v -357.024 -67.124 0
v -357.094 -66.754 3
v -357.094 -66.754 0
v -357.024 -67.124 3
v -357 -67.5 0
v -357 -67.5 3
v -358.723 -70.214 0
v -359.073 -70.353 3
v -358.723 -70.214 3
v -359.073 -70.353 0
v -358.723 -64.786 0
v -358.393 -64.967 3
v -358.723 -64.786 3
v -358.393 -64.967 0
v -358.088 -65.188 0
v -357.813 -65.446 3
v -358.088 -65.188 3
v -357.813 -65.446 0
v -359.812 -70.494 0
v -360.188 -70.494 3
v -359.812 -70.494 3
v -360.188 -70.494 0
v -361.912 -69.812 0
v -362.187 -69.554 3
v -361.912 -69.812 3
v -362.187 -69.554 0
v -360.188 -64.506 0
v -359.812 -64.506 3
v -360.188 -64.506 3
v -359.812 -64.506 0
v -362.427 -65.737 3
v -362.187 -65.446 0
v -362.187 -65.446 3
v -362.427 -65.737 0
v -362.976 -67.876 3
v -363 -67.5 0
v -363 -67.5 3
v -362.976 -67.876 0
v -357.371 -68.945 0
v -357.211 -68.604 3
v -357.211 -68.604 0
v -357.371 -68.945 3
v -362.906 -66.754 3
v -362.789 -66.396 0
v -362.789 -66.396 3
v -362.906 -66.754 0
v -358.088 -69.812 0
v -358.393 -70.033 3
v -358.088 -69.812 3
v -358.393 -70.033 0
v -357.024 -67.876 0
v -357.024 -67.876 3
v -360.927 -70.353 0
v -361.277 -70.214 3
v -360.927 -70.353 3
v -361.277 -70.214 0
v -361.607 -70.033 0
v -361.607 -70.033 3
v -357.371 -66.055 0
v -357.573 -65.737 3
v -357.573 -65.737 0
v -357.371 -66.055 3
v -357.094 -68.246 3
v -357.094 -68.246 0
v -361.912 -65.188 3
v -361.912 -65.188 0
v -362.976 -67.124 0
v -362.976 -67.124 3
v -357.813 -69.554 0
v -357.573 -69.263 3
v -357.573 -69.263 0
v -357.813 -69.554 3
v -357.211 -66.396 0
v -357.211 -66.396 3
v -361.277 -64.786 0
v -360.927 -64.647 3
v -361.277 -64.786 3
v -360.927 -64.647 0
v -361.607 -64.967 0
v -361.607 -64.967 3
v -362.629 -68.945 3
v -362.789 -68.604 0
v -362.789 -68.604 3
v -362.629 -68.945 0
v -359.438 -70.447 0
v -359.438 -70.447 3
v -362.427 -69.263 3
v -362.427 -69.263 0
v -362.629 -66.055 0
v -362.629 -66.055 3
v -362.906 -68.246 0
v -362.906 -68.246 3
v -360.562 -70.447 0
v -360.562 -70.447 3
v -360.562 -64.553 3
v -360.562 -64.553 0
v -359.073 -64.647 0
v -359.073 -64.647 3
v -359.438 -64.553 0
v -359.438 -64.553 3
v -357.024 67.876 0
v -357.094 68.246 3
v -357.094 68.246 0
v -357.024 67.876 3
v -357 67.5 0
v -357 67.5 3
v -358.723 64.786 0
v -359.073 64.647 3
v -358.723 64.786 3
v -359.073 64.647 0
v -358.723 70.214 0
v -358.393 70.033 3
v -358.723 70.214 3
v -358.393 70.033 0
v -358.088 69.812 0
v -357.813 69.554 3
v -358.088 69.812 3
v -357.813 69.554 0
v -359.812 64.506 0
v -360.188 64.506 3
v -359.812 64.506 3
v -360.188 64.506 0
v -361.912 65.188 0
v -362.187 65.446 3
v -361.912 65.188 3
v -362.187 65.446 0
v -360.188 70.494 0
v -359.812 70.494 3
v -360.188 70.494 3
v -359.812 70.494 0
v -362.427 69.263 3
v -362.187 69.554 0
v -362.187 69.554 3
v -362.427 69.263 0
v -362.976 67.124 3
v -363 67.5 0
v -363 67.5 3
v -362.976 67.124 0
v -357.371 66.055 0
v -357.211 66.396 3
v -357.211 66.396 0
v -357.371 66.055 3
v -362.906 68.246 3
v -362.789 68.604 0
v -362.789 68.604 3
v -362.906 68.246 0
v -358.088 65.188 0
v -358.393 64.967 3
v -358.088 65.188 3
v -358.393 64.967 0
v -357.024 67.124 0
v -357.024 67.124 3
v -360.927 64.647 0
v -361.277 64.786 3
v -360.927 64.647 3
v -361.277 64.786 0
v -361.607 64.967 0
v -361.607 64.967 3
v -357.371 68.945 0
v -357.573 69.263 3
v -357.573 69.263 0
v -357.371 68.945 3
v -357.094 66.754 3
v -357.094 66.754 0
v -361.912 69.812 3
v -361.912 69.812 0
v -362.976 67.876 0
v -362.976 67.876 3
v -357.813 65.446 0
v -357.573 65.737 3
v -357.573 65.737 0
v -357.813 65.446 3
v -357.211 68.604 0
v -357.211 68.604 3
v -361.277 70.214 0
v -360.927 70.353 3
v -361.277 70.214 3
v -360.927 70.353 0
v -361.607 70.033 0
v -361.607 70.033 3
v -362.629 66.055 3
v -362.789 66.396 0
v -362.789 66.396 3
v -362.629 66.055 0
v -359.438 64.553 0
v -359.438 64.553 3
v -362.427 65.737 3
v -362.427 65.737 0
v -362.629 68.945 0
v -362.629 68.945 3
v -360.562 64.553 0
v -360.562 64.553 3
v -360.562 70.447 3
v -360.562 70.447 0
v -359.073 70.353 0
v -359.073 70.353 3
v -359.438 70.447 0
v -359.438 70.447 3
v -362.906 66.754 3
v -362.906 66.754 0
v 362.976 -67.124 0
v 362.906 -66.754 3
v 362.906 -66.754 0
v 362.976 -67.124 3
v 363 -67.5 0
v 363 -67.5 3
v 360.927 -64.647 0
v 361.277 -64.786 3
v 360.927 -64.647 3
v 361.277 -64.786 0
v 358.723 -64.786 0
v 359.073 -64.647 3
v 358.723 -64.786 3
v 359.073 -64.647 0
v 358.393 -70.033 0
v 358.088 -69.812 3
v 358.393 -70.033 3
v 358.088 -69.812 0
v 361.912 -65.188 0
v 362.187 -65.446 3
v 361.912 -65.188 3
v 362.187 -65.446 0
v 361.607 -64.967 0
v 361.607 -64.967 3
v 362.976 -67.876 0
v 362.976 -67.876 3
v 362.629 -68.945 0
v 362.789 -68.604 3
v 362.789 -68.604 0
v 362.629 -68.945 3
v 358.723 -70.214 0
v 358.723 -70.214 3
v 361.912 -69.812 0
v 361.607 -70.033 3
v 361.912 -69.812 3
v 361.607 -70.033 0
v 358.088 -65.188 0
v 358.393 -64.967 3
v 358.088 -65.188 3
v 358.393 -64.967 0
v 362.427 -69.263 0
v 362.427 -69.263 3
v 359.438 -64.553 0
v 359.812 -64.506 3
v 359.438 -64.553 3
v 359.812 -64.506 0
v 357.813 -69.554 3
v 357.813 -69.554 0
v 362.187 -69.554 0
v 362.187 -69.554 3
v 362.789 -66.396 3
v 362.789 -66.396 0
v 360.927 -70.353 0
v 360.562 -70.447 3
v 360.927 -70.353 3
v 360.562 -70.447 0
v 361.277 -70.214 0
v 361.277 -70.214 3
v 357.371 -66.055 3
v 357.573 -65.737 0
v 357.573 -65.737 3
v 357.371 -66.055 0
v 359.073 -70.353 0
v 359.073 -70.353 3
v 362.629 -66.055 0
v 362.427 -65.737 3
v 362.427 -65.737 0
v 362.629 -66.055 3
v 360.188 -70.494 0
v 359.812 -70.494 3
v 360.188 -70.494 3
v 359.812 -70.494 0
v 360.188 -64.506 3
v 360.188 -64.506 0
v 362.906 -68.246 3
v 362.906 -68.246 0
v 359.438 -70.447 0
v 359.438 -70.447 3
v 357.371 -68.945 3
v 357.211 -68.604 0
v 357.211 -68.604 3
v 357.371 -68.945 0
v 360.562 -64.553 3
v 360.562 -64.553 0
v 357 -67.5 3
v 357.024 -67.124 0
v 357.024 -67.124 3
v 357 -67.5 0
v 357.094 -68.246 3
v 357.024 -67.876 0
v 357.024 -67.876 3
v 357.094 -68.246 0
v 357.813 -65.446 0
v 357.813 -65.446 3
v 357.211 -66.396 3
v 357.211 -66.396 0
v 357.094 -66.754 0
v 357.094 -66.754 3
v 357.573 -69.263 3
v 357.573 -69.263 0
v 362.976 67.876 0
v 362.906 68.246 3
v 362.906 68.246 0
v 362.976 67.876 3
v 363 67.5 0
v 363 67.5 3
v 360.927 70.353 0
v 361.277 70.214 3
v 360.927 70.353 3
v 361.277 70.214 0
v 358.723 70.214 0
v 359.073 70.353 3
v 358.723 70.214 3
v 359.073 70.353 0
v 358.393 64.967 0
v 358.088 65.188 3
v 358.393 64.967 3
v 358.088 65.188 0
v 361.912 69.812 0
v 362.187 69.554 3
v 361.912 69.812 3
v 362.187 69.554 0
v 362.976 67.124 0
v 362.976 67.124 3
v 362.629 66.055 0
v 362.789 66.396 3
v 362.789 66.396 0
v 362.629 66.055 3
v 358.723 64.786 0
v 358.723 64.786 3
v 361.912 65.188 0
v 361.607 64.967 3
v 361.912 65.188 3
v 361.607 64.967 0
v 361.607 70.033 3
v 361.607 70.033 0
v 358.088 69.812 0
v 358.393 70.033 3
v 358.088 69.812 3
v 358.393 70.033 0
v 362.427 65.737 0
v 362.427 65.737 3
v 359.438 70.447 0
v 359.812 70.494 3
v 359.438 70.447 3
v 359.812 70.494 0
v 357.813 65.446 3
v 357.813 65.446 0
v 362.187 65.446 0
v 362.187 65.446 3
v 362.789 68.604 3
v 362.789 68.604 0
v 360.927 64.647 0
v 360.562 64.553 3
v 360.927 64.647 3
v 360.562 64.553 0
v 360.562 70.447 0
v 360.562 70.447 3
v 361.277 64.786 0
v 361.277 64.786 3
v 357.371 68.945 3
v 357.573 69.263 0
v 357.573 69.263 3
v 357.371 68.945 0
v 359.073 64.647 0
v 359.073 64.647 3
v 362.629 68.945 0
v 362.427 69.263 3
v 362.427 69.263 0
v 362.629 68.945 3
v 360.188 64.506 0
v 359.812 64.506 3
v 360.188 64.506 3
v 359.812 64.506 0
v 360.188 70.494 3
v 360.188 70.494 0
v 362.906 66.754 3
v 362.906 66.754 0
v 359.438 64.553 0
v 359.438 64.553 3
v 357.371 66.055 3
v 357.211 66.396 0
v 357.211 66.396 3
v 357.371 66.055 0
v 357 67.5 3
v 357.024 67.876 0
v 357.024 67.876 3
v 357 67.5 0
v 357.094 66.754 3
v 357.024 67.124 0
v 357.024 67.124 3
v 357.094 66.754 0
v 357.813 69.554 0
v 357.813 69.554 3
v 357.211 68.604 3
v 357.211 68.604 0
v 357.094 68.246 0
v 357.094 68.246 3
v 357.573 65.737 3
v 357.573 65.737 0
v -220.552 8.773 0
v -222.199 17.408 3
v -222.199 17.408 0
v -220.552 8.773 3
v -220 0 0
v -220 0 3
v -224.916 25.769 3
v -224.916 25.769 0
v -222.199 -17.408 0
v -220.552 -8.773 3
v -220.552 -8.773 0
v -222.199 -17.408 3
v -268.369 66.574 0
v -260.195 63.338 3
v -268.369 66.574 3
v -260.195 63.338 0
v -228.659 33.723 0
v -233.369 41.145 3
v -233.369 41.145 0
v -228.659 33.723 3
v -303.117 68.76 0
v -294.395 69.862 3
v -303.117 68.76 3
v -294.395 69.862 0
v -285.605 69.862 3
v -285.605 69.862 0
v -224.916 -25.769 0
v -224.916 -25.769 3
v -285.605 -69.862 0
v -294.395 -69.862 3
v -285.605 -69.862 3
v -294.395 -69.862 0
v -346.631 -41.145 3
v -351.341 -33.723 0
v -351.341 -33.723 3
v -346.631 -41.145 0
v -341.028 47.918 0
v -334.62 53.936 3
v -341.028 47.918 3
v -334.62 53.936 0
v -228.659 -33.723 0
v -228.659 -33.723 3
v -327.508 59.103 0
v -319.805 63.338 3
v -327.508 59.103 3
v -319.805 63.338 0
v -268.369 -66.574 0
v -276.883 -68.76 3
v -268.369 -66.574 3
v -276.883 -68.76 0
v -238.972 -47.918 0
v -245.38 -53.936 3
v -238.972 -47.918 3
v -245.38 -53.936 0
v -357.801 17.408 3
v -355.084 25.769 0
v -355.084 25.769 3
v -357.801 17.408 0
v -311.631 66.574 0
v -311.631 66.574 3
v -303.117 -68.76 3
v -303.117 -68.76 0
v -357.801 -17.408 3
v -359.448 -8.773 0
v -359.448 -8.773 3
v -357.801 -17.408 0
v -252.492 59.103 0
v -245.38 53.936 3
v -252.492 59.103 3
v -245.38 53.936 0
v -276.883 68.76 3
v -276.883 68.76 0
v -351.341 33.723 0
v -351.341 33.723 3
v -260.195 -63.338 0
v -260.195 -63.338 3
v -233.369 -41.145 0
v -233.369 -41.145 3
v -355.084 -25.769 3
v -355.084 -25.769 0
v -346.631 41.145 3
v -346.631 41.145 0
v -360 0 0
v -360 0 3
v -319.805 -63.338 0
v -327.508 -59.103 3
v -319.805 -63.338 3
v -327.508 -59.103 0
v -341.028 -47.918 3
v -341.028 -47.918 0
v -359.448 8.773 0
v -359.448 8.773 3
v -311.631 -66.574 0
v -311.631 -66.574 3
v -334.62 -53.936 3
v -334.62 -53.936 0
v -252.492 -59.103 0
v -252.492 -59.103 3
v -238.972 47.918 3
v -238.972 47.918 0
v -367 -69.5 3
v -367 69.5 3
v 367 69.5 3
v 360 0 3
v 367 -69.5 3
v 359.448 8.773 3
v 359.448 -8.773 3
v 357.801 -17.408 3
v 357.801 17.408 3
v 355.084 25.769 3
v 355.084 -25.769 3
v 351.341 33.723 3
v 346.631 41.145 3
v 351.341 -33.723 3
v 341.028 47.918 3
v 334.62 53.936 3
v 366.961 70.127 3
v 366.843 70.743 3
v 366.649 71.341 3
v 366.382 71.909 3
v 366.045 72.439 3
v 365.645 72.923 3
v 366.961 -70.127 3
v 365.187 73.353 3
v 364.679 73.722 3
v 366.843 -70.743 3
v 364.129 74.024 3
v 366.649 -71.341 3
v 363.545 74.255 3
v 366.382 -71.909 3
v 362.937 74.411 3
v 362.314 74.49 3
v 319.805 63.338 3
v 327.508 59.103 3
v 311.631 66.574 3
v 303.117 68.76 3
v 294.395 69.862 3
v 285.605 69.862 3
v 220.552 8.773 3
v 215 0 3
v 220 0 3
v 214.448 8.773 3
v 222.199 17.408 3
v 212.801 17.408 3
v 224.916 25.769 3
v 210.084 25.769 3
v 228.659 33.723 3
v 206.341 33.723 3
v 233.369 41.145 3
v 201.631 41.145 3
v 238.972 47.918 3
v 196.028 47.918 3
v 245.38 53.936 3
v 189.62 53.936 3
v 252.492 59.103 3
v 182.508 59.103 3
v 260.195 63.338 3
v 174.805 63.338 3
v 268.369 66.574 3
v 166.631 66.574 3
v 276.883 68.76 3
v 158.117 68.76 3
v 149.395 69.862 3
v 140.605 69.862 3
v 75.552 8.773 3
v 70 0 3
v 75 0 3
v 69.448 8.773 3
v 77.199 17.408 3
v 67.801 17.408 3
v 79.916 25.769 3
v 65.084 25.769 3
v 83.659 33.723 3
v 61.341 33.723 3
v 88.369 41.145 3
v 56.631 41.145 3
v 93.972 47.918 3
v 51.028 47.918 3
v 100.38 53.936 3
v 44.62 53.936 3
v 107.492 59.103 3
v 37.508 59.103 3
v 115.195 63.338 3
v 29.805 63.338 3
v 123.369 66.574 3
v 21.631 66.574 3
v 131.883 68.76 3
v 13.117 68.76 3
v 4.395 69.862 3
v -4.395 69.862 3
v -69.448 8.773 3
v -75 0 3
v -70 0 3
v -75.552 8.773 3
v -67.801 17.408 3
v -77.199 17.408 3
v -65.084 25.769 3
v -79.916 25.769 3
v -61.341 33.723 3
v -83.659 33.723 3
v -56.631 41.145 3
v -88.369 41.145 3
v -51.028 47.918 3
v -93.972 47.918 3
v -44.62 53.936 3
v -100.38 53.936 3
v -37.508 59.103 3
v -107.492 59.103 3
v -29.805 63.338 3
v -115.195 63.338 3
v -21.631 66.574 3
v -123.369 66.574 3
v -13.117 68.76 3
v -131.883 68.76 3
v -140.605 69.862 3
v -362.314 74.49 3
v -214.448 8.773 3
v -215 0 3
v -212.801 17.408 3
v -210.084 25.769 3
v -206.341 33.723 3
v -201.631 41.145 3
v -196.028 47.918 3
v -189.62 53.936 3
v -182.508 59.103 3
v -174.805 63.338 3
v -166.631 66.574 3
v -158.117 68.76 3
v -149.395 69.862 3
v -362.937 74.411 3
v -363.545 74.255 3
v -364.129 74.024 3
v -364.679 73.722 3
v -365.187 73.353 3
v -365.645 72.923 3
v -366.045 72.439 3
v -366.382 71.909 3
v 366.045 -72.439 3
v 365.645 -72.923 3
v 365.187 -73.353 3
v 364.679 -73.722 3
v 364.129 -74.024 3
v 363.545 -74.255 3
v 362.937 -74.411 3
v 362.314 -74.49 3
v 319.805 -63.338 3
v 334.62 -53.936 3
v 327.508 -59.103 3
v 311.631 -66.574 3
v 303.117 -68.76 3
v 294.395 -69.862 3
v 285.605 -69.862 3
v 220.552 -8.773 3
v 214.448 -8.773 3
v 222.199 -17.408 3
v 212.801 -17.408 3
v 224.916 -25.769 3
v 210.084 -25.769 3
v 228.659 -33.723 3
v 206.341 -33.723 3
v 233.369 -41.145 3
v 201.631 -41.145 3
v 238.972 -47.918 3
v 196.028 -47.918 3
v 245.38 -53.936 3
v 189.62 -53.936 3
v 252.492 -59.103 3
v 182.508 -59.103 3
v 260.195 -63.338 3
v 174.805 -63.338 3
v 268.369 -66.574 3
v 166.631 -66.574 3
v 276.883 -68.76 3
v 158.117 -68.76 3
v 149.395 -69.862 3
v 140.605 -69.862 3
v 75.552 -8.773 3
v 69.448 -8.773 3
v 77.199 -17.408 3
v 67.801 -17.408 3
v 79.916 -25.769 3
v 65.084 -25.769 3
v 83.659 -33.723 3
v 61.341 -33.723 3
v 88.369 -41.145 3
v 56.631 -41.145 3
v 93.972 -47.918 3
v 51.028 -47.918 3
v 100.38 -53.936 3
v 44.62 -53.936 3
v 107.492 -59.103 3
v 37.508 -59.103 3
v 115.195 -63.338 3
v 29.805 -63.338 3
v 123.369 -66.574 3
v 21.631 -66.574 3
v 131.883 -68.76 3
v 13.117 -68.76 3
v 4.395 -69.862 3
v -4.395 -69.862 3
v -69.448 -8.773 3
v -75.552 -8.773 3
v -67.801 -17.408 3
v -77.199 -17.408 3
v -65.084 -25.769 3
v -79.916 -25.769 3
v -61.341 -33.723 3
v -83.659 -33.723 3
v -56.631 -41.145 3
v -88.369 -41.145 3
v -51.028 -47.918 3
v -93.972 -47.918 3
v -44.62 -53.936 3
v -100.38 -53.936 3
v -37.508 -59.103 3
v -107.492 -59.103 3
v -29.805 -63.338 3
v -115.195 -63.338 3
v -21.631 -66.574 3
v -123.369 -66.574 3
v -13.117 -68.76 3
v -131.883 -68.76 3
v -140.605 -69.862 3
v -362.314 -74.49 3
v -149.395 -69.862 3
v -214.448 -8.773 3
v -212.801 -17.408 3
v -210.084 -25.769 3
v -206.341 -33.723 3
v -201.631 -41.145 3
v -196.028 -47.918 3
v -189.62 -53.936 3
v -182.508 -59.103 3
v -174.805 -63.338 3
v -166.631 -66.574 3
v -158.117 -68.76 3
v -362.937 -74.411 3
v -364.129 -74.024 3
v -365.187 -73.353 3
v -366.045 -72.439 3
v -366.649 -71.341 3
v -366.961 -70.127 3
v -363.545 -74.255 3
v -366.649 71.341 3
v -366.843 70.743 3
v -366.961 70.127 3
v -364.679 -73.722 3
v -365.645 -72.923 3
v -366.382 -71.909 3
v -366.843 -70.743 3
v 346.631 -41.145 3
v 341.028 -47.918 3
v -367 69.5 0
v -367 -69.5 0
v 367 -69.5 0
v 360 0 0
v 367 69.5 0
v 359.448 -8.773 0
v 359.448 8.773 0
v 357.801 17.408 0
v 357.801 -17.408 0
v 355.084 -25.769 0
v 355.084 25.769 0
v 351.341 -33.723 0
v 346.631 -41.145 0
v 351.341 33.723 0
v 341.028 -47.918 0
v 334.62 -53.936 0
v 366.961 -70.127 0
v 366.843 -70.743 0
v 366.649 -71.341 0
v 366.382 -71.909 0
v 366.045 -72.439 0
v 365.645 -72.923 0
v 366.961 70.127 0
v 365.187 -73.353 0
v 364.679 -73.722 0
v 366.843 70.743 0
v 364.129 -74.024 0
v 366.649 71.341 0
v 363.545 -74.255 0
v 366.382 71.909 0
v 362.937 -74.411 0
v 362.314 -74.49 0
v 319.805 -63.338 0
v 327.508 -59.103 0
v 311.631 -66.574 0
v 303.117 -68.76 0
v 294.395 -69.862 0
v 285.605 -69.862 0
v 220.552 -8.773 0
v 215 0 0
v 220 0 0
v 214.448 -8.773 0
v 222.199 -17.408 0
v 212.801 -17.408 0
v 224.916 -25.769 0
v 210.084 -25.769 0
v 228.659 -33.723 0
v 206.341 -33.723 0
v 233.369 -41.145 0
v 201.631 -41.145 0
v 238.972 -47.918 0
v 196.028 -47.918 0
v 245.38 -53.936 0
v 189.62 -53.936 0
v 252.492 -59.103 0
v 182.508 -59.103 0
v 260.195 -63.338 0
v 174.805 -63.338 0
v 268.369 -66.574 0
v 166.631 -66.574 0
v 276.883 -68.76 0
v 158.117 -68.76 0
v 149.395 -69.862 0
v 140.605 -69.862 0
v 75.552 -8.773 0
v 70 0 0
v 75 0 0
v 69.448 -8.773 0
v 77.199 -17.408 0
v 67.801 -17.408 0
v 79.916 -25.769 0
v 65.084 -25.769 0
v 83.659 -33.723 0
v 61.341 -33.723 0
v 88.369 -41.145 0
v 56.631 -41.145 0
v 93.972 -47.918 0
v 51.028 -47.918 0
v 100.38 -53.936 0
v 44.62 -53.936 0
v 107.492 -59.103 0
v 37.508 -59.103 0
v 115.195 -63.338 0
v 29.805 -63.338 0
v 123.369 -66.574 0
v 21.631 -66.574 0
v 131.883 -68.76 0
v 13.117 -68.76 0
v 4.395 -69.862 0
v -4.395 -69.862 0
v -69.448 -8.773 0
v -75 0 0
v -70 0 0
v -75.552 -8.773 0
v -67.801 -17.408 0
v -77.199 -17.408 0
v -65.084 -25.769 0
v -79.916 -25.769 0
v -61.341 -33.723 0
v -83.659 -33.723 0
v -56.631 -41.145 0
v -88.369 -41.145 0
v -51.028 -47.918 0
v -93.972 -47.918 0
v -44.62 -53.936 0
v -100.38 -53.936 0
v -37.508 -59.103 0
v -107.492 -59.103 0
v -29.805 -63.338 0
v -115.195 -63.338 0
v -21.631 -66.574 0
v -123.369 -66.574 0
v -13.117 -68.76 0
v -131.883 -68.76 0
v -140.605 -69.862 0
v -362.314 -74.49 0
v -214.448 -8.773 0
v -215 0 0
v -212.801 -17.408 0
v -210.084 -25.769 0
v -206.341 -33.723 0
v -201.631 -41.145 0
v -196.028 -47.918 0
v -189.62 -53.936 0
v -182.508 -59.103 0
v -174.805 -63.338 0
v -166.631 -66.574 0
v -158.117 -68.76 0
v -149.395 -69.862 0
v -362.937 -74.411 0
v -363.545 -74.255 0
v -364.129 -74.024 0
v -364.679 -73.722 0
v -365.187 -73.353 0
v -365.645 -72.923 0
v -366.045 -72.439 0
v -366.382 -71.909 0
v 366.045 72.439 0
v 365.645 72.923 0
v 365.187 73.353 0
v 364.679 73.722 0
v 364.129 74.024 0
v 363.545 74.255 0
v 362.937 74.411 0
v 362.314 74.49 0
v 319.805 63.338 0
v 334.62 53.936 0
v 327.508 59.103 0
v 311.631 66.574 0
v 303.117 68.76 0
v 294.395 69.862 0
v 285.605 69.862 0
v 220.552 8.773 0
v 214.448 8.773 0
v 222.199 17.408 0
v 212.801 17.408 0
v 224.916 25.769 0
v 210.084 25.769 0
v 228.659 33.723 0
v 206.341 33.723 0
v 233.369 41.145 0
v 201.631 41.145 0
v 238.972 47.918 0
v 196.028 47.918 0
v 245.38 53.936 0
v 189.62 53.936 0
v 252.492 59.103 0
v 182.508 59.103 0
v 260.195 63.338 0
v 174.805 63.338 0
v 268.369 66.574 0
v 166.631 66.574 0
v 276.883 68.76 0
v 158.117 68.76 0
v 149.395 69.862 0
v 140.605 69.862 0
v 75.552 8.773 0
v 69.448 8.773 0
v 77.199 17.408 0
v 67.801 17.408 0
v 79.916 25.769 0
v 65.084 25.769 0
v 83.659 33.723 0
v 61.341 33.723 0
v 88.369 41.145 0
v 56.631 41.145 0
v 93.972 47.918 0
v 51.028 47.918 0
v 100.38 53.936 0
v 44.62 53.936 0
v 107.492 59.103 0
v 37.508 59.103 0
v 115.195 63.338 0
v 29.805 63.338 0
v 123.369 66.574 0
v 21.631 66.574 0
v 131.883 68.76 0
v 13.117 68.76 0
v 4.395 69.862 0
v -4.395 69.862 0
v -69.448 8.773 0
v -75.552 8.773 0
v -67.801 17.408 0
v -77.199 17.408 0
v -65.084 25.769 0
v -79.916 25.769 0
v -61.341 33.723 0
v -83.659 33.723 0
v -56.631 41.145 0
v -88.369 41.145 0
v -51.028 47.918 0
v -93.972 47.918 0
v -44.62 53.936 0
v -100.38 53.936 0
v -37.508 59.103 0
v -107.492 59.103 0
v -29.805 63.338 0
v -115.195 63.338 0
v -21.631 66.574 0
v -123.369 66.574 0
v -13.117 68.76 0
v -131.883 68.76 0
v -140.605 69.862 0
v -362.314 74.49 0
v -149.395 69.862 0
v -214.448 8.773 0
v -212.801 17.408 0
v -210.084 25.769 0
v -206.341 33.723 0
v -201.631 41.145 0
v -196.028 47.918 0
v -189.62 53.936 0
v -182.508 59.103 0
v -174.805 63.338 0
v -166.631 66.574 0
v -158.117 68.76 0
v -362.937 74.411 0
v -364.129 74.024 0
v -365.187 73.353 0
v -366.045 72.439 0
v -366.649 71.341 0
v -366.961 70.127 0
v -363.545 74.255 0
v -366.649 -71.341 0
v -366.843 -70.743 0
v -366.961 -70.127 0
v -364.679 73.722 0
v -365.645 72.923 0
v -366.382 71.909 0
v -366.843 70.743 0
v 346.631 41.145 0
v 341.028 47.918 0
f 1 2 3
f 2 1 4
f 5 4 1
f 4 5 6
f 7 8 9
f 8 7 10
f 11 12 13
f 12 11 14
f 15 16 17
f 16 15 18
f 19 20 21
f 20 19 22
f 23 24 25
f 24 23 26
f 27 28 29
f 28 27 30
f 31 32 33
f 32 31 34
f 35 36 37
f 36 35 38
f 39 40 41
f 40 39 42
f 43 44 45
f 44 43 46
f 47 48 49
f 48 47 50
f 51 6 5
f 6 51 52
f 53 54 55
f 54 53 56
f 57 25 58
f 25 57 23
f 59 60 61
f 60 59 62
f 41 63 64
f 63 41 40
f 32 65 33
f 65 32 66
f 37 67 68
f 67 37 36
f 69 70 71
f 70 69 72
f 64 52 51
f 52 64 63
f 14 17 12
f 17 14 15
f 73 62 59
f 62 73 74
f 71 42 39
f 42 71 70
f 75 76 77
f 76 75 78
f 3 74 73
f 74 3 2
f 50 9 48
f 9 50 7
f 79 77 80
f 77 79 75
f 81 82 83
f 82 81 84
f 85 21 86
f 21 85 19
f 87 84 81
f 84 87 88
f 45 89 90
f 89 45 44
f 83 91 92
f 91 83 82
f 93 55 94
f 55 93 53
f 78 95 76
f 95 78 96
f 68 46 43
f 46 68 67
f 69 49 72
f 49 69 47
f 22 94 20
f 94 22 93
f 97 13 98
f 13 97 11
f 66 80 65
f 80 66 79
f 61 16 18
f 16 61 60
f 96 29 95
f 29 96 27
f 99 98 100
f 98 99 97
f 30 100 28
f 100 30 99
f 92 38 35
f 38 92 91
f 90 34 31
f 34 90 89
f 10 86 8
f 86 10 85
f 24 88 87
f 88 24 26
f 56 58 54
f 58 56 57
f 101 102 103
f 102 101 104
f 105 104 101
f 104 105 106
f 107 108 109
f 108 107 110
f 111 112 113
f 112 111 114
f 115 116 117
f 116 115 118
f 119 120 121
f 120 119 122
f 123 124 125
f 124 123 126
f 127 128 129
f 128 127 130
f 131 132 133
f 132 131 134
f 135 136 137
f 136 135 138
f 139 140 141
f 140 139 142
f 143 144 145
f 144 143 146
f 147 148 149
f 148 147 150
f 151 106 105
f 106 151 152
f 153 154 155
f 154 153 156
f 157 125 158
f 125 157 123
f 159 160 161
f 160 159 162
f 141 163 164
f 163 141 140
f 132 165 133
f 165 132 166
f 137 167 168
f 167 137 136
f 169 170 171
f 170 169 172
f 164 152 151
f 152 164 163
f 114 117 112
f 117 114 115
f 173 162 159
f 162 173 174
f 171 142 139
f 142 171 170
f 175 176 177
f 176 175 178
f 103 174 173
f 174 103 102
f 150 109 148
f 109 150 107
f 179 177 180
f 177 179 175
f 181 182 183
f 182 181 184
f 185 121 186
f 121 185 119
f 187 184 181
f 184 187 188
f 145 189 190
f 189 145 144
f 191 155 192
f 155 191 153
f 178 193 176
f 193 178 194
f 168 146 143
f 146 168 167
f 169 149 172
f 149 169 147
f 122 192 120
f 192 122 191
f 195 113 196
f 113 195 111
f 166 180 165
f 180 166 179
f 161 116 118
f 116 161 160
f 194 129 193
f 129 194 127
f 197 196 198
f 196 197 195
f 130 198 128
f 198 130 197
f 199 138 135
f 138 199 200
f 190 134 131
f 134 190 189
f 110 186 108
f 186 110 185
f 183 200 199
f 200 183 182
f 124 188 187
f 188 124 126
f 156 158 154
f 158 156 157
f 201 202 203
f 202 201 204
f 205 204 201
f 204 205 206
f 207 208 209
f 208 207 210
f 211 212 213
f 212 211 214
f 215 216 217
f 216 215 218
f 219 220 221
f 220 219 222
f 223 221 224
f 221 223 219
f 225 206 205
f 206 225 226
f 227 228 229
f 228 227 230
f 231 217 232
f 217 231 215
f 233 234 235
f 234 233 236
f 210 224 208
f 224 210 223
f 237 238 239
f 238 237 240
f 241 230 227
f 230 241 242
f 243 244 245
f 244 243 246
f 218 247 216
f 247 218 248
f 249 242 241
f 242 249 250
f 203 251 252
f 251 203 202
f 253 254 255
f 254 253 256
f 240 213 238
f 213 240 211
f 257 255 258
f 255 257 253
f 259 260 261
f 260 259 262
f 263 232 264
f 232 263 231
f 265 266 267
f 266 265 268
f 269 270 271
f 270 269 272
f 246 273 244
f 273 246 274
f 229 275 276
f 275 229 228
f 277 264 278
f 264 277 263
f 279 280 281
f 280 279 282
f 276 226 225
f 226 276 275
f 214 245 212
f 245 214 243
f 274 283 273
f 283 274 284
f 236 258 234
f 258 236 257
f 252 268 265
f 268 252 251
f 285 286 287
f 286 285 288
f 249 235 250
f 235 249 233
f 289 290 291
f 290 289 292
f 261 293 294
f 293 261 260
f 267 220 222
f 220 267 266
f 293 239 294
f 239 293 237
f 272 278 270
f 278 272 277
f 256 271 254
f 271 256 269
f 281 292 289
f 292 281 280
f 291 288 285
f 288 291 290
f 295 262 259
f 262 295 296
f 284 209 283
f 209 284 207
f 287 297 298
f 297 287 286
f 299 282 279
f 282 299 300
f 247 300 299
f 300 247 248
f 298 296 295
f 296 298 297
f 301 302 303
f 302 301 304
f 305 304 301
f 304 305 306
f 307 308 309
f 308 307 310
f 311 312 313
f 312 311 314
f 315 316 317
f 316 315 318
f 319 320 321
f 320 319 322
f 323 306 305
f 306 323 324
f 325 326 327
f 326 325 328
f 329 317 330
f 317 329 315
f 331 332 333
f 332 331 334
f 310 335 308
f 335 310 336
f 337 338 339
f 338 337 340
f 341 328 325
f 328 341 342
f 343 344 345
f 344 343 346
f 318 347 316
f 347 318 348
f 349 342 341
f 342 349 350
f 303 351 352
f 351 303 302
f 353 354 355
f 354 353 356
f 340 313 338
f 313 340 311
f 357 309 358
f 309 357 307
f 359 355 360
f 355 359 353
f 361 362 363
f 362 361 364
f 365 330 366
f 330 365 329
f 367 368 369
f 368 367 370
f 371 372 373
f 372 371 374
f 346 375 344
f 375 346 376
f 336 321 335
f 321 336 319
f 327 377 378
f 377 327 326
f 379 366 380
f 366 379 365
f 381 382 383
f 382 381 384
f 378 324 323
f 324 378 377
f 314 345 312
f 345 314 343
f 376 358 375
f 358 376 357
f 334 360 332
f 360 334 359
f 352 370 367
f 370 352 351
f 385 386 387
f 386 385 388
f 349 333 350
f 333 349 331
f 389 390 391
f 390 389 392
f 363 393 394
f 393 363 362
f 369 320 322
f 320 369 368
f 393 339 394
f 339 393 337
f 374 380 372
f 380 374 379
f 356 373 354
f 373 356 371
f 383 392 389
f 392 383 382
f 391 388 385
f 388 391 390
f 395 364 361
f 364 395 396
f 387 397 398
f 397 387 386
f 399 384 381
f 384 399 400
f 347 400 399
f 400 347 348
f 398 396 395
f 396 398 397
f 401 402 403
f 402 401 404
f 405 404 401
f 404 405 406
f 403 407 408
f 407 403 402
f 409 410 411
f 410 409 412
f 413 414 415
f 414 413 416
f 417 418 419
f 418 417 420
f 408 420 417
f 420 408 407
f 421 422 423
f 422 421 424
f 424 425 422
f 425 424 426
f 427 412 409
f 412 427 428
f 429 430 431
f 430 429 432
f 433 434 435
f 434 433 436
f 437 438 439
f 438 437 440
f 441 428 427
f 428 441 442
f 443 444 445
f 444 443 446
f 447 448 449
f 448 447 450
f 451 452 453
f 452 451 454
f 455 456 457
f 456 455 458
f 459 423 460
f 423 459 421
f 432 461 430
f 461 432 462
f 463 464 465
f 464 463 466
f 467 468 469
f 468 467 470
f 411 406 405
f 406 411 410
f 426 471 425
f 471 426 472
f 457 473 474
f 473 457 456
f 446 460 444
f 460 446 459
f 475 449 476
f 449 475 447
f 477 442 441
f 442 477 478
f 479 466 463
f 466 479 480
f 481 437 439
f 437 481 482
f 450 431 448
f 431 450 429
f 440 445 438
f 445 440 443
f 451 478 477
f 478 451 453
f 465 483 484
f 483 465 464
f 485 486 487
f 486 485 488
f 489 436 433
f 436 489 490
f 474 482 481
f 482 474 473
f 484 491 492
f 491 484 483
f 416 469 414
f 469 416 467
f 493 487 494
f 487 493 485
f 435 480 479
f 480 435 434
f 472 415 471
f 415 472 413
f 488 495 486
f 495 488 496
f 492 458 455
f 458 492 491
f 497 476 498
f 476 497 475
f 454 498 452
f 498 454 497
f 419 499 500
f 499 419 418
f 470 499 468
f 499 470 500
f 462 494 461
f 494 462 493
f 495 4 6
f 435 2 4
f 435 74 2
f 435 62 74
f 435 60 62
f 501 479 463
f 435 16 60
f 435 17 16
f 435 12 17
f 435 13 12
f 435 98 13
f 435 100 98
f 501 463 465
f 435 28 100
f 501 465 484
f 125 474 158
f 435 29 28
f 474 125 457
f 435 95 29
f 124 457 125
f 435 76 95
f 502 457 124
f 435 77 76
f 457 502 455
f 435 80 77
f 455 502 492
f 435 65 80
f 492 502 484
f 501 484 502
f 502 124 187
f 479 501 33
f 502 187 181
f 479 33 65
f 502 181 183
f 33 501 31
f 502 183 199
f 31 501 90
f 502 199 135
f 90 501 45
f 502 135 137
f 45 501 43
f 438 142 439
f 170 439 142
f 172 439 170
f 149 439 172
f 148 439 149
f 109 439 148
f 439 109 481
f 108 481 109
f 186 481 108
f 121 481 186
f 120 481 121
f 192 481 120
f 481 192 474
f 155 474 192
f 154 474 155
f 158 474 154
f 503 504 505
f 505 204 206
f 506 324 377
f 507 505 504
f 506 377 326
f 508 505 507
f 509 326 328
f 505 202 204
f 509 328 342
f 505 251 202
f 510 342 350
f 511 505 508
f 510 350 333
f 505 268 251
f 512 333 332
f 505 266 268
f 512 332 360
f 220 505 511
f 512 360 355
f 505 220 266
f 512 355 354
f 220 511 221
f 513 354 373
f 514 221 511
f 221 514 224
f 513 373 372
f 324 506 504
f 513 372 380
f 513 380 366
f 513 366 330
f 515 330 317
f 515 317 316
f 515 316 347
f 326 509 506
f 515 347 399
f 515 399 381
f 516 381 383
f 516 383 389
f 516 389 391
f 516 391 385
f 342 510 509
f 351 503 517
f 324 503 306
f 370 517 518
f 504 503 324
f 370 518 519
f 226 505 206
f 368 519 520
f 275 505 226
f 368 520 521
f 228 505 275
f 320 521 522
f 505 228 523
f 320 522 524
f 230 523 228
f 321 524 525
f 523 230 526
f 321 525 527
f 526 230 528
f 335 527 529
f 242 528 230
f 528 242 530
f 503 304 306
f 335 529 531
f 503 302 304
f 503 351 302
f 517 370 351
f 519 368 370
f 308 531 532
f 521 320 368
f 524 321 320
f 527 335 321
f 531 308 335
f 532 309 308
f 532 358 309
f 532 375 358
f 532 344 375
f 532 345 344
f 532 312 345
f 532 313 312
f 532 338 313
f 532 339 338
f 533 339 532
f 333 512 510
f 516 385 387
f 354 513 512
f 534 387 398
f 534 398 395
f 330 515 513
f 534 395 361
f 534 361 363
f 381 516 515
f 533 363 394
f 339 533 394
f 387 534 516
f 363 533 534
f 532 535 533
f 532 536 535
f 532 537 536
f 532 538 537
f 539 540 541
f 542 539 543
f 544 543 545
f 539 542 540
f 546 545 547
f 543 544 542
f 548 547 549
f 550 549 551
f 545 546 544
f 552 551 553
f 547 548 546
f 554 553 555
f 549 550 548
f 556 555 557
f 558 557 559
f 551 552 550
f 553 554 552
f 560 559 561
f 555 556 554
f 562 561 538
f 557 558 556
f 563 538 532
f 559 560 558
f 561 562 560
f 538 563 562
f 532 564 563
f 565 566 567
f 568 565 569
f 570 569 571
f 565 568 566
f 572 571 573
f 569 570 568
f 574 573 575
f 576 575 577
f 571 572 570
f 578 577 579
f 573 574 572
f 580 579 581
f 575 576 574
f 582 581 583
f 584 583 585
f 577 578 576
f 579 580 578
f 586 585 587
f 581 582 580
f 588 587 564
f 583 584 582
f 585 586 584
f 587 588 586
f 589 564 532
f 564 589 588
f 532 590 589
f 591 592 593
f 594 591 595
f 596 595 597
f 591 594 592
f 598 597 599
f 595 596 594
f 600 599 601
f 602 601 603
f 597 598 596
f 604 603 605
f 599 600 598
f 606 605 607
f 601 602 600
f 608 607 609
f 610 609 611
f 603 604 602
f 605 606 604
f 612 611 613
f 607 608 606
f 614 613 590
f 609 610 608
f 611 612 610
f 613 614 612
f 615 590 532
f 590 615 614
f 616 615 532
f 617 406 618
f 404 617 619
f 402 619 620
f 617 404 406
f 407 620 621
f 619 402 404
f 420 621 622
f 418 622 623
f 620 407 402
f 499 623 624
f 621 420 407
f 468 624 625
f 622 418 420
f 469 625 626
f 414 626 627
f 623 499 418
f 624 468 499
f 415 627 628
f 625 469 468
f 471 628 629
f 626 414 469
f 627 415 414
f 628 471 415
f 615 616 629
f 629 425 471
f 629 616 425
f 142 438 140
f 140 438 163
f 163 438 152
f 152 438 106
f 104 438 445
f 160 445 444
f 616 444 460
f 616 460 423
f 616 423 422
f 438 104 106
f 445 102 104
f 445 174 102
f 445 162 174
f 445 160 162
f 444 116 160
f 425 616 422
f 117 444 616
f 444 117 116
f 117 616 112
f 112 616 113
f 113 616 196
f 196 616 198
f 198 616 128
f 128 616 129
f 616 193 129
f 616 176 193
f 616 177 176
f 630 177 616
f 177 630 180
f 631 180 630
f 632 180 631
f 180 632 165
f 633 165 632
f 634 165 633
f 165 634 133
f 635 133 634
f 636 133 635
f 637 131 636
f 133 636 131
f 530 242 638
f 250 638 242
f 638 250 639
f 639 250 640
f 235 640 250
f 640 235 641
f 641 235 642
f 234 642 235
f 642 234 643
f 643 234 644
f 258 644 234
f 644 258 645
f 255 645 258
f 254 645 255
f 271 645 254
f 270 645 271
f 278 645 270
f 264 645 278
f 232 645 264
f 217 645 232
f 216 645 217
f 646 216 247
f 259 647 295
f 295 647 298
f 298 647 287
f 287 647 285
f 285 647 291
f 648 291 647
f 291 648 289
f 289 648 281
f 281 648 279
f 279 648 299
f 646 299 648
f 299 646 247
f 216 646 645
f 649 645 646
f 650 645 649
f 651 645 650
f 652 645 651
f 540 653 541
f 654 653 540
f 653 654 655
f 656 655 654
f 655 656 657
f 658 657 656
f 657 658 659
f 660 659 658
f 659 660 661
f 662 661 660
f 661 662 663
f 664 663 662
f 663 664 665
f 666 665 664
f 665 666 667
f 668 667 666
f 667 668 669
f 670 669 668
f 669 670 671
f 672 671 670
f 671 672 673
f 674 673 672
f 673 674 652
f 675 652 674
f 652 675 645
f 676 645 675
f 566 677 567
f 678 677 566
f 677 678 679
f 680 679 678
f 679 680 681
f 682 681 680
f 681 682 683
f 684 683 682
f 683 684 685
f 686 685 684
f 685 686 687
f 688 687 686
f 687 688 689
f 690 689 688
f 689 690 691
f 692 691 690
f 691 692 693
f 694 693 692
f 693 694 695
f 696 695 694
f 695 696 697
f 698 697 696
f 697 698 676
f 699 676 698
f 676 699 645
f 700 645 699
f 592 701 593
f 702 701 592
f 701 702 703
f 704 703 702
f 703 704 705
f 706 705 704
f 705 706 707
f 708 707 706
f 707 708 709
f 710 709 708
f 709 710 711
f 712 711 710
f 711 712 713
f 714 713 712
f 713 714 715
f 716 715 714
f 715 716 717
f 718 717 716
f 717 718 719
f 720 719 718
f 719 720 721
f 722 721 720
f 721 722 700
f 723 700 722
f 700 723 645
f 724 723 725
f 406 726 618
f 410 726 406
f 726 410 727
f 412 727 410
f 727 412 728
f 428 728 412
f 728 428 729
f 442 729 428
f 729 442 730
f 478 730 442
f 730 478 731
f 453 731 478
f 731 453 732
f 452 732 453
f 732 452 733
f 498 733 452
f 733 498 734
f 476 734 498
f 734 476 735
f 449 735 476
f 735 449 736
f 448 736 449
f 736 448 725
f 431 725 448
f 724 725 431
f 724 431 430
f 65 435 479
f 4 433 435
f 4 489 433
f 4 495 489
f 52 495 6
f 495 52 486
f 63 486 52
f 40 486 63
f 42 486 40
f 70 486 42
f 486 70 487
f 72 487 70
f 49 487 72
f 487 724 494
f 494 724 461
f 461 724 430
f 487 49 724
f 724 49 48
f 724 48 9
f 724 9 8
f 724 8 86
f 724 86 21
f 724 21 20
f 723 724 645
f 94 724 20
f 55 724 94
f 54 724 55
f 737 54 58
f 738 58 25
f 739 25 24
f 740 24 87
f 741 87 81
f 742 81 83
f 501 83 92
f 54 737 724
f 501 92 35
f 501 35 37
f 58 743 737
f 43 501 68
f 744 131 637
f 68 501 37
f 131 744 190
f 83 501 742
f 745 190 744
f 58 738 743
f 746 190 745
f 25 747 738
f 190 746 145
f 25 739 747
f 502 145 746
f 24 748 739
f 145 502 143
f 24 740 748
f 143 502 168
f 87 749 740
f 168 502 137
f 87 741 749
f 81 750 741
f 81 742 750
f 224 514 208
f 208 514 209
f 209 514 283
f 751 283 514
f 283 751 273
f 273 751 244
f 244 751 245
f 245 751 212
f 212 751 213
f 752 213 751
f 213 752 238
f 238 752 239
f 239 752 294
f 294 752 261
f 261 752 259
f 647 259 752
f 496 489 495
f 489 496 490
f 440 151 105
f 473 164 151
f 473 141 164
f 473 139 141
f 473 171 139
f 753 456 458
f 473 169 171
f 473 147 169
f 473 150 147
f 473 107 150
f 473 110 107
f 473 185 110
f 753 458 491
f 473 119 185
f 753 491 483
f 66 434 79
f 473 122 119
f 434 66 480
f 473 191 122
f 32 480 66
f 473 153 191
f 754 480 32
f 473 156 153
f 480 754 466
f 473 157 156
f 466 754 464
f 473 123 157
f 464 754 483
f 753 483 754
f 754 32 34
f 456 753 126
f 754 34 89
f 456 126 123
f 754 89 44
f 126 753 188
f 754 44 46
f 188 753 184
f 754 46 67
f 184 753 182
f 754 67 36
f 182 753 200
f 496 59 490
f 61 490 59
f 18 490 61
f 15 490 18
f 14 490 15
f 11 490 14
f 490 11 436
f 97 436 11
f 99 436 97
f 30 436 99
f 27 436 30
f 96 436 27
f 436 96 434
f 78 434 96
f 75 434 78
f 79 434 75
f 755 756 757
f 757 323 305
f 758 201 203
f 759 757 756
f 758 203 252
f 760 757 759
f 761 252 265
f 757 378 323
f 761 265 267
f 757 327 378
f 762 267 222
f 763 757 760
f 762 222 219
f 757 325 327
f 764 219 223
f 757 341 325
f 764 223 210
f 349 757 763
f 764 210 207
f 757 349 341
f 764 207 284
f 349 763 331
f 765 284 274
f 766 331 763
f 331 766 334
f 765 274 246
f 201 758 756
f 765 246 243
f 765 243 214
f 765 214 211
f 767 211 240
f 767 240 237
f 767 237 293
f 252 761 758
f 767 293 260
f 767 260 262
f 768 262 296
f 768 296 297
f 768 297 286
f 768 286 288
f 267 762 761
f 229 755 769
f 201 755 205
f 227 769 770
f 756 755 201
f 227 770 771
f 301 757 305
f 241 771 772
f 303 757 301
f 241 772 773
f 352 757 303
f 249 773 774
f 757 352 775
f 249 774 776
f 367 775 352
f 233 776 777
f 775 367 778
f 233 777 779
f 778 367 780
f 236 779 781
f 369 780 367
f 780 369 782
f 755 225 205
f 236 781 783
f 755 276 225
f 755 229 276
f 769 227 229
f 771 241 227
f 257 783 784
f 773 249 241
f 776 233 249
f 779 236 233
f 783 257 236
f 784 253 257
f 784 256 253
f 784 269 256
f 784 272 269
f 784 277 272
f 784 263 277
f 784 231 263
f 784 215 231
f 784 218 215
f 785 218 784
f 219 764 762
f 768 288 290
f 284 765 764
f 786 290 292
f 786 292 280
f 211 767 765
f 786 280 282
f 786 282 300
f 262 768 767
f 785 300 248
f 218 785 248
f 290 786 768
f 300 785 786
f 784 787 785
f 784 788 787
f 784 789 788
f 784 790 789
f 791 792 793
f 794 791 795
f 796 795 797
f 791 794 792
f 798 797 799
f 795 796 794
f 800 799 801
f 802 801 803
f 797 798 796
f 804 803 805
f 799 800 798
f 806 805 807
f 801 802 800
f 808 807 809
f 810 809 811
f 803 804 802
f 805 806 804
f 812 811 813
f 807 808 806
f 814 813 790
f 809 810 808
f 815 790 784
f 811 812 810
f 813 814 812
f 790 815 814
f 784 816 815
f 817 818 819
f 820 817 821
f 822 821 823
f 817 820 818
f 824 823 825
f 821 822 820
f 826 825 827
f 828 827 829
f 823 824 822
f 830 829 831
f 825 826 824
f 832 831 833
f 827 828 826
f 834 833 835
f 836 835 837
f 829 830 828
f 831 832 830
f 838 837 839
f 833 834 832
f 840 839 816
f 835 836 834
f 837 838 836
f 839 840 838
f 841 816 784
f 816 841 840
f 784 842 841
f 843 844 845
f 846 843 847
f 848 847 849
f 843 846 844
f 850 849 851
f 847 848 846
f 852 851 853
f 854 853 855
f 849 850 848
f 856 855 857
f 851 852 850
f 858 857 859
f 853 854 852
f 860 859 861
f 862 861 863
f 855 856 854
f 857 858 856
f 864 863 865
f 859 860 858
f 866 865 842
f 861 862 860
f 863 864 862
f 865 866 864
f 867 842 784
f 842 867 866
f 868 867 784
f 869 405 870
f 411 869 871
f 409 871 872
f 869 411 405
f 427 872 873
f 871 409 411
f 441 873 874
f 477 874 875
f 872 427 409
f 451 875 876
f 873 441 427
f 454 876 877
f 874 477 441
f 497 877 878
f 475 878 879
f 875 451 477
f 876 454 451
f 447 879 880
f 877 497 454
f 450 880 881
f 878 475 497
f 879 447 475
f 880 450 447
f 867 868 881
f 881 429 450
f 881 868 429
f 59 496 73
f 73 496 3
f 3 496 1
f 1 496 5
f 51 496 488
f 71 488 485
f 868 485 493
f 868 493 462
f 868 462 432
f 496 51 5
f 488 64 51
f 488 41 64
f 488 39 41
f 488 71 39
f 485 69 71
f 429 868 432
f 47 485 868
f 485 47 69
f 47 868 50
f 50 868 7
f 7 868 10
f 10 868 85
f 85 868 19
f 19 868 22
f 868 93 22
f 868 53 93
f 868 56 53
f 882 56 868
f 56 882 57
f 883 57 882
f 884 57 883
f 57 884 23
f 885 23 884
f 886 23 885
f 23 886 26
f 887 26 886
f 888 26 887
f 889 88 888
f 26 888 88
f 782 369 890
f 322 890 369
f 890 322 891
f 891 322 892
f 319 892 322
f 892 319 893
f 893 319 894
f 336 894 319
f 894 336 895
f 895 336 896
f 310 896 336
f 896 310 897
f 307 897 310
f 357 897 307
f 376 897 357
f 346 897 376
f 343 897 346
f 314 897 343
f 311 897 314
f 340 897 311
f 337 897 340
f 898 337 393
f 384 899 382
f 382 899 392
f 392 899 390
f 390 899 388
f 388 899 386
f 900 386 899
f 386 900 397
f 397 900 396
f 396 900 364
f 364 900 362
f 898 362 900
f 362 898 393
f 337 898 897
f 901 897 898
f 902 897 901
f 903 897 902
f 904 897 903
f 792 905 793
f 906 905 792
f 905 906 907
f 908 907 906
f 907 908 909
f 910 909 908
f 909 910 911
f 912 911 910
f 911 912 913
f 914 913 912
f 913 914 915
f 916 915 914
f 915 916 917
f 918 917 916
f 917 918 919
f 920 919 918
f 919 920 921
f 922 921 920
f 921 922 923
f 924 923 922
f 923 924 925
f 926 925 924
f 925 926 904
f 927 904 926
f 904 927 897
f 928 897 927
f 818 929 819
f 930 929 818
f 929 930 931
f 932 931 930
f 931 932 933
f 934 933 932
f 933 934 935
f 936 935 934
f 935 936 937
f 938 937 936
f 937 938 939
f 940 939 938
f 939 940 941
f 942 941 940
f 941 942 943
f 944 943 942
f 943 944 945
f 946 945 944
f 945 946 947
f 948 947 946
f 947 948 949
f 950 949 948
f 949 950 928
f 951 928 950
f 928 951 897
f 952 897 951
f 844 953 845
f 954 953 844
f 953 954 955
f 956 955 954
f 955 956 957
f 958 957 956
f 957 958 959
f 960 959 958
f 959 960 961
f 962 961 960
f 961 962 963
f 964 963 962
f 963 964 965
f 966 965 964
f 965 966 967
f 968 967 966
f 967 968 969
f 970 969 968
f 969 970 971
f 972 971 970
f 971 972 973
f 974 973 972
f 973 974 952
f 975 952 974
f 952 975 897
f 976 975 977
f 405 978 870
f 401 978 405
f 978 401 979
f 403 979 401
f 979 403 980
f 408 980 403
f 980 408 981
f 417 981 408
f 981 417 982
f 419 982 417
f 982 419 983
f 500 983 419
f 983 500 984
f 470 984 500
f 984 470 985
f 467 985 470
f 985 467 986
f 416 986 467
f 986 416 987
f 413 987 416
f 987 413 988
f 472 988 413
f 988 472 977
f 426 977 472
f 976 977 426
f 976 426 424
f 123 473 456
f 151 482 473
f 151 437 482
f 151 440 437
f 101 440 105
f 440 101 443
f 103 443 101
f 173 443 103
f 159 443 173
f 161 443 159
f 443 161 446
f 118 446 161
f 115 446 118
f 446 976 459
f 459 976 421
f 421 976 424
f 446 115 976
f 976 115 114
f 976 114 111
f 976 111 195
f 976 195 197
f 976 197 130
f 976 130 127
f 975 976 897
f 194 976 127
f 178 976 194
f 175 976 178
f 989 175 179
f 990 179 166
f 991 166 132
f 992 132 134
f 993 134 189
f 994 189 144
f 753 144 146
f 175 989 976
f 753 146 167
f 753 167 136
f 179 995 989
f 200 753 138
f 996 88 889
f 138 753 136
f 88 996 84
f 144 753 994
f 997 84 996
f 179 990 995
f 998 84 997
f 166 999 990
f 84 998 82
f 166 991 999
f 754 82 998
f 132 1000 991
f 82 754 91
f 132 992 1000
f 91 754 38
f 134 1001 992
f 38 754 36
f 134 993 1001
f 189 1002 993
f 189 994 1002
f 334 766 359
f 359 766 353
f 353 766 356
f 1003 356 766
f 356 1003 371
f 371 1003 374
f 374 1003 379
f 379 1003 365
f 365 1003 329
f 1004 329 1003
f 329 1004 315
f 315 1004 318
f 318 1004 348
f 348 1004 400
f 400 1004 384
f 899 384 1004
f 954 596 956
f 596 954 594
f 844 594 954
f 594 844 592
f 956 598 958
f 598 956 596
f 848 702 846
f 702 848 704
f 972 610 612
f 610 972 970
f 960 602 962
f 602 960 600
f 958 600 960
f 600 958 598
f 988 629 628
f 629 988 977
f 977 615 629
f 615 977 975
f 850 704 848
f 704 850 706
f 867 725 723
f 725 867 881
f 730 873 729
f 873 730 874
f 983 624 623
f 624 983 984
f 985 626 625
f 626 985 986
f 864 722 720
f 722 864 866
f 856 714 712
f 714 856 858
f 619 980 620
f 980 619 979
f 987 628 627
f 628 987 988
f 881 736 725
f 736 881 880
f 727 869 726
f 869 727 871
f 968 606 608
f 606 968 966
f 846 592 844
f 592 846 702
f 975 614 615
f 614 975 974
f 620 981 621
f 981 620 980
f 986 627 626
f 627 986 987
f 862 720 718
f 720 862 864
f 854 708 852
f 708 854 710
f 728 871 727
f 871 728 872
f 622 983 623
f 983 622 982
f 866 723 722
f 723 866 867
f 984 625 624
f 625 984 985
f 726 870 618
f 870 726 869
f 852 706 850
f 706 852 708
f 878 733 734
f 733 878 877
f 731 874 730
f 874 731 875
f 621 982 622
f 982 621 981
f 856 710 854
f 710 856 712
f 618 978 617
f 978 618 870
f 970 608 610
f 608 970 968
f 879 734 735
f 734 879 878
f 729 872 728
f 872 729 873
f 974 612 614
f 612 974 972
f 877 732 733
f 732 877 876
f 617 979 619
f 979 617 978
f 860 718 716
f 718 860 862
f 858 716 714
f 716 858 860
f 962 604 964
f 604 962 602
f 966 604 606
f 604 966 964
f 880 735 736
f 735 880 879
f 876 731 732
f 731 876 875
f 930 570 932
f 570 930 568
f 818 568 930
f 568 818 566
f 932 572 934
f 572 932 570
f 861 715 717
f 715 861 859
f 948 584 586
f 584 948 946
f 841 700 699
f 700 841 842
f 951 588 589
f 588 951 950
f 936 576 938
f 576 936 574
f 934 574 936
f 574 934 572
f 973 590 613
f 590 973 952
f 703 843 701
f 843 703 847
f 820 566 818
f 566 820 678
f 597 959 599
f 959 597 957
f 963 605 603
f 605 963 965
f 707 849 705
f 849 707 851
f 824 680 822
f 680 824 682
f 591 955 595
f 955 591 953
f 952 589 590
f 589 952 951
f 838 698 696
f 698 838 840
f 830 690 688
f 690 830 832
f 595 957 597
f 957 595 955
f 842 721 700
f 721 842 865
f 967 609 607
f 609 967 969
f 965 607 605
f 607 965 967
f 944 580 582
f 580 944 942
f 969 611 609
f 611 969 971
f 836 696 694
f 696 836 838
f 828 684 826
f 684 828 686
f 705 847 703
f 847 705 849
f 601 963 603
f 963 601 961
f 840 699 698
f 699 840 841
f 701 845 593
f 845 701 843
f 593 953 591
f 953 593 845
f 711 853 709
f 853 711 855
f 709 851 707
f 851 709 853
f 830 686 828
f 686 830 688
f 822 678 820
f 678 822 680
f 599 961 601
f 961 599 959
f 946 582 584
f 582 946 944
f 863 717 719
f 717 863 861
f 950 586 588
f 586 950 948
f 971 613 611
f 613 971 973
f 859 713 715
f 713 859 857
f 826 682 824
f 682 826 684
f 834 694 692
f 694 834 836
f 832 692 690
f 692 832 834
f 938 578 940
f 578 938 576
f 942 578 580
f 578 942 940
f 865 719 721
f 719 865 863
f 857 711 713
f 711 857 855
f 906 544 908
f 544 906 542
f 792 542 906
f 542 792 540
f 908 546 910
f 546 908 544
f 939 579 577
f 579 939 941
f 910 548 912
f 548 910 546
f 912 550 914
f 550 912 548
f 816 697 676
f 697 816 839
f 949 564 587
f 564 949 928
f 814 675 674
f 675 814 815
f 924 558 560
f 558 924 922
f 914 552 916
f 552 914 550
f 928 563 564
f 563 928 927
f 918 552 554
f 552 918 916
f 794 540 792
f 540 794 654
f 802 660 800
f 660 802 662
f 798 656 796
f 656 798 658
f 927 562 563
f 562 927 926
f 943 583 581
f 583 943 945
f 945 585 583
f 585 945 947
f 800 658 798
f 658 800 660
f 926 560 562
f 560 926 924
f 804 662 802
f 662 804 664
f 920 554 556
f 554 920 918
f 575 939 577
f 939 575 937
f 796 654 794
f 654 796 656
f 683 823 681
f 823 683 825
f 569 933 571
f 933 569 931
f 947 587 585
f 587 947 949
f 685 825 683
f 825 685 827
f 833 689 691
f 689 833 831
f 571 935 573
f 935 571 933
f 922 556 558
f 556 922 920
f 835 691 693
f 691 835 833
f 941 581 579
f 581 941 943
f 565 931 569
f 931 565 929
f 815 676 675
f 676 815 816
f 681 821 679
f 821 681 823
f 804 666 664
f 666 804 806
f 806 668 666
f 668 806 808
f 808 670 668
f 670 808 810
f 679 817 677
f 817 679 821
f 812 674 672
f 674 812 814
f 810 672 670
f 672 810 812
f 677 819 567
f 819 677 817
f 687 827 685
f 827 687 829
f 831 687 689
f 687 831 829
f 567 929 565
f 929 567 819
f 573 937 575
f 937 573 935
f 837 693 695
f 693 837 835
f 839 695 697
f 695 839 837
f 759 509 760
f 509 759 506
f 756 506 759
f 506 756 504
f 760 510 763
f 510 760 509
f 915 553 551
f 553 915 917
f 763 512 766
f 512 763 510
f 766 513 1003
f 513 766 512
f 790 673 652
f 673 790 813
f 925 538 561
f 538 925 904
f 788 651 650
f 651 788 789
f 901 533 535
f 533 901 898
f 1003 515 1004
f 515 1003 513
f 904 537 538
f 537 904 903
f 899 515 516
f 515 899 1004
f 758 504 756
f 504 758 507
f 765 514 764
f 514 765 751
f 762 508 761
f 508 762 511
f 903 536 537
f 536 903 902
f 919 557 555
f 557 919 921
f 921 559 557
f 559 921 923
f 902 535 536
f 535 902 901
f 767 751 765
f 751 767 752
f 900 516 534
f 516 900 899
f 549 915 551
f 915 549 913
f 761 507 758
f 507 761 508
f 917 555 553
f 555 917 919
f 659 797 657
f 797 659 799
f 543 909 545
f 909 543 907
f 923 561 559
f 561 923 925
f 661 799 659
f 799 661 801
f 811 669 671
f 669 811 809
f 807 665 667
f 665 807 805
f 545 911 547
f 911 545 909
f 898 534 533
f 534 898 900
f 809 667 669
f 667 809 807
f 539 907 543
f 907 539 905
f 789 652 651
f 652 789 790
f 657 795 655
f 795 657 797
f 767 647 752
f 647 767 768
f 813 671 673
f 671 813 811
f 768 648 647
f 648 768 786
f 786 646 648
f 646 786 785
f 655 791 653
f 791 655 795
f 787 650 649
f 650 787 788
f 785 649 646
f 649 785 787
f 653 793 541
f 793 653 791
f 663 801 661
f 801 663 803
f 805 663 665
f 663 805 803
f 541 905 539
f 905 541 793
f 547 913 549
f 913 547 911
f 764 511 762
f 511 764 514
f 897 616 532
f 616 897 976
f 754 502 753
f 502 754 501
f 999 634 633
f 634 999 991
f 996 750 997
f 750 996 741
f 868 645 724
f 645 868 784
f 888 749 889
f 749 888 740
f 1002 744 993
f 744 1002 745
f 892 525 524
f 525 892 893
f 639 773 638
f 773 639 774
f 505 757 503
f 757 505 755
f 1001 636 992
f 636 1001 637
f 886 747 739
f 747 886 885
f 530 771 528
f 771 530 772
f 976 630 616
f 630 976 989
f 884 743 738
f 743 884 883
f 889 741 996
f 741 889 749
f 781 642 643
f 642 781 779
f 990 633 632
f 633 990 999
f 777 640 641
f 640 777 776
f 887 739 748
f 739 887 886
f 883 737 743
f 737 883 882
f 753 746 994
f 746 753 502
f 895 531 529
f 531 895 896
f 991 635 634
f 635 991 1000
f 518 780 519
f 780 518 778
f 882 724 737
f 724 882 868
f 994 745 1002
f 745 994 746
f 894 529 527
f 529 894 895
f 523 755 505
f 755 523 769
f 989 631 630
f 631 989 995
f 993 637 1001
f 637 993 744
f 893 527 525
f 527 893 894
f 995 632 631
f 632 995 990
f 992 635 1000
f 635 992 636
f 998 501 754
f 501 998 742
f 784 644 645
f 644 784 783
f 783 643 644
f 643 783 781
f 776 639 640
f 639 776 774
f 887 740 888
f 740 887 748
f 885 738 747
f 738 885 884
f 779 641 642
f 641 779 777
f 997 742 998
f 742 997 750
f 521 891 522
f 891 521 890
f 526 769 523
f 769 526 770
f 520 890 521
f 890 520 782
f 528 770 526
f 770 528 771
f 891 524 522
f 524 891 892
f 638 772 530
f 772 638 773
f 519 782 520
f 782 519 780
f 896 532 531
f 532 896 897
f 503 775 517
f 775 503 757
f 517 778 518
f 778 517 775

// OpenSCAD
$fn = 50;


difference() {
	union() {
		hull() {
			translate(v = [-362.0000000000, 69.5000000000, 0]) {
				cylinder(h = 3, r = 5);
			}
			translate(v = [362.0000000000, 69.5000000000, 0]) {
				cylinder(h = 3, r = 5);
			}
			translate(v = [-362.0000000000, -69.5000000000, 0]) {
				cylinder(h = 3, r = 5);
			}
			translate(v = [362.0000000000, -69.5000000000, 0]) {
				cylinder(h = 3, r = 5);
			}
		}
	}
	union() {
		#translate(v = [-360.0000000000, -67.5000000000, -100.0000000000]) {
			cylinder(h = 200, r = 3.0000000000);
		}
		#translate(v = [-360.0000000000, 67.5000000000, -100.0000000000]) {
			cylinder(h = 200, r = 3.0000000000);
		}
		#translate(v = [360.0000000000, -67.5000000000, -100.0000000000]) {
			cylinder(h = 200, r = 3.0000000000);
		}
		#translate(v = [360.0000000000, 67.5000000000, -100.0000000000]) {
			cylinder(h = 200, r = 3.0000000000);
		}
		#translate(v = [-290.0000000000, 0, 0]) {
			cylinder(h = 3, r = 70.0000000000);
		}
		#translate(v = [-145.0000000000, 0, 0]) {
			cylinder(h = 3, r = 70.0000000000);
		}
		#cylinder(h = 3, r = 70.0000000000);
		#translate(v = [145.0000000000, 0, 0]) {
			cylinder(h = 3, r = 70.0000000000);
		}
		#translate(v = [290.0000000000, 0, 0]) {
			cylinder(h = 3, r = 70.0000000000);
		}
	}
}
